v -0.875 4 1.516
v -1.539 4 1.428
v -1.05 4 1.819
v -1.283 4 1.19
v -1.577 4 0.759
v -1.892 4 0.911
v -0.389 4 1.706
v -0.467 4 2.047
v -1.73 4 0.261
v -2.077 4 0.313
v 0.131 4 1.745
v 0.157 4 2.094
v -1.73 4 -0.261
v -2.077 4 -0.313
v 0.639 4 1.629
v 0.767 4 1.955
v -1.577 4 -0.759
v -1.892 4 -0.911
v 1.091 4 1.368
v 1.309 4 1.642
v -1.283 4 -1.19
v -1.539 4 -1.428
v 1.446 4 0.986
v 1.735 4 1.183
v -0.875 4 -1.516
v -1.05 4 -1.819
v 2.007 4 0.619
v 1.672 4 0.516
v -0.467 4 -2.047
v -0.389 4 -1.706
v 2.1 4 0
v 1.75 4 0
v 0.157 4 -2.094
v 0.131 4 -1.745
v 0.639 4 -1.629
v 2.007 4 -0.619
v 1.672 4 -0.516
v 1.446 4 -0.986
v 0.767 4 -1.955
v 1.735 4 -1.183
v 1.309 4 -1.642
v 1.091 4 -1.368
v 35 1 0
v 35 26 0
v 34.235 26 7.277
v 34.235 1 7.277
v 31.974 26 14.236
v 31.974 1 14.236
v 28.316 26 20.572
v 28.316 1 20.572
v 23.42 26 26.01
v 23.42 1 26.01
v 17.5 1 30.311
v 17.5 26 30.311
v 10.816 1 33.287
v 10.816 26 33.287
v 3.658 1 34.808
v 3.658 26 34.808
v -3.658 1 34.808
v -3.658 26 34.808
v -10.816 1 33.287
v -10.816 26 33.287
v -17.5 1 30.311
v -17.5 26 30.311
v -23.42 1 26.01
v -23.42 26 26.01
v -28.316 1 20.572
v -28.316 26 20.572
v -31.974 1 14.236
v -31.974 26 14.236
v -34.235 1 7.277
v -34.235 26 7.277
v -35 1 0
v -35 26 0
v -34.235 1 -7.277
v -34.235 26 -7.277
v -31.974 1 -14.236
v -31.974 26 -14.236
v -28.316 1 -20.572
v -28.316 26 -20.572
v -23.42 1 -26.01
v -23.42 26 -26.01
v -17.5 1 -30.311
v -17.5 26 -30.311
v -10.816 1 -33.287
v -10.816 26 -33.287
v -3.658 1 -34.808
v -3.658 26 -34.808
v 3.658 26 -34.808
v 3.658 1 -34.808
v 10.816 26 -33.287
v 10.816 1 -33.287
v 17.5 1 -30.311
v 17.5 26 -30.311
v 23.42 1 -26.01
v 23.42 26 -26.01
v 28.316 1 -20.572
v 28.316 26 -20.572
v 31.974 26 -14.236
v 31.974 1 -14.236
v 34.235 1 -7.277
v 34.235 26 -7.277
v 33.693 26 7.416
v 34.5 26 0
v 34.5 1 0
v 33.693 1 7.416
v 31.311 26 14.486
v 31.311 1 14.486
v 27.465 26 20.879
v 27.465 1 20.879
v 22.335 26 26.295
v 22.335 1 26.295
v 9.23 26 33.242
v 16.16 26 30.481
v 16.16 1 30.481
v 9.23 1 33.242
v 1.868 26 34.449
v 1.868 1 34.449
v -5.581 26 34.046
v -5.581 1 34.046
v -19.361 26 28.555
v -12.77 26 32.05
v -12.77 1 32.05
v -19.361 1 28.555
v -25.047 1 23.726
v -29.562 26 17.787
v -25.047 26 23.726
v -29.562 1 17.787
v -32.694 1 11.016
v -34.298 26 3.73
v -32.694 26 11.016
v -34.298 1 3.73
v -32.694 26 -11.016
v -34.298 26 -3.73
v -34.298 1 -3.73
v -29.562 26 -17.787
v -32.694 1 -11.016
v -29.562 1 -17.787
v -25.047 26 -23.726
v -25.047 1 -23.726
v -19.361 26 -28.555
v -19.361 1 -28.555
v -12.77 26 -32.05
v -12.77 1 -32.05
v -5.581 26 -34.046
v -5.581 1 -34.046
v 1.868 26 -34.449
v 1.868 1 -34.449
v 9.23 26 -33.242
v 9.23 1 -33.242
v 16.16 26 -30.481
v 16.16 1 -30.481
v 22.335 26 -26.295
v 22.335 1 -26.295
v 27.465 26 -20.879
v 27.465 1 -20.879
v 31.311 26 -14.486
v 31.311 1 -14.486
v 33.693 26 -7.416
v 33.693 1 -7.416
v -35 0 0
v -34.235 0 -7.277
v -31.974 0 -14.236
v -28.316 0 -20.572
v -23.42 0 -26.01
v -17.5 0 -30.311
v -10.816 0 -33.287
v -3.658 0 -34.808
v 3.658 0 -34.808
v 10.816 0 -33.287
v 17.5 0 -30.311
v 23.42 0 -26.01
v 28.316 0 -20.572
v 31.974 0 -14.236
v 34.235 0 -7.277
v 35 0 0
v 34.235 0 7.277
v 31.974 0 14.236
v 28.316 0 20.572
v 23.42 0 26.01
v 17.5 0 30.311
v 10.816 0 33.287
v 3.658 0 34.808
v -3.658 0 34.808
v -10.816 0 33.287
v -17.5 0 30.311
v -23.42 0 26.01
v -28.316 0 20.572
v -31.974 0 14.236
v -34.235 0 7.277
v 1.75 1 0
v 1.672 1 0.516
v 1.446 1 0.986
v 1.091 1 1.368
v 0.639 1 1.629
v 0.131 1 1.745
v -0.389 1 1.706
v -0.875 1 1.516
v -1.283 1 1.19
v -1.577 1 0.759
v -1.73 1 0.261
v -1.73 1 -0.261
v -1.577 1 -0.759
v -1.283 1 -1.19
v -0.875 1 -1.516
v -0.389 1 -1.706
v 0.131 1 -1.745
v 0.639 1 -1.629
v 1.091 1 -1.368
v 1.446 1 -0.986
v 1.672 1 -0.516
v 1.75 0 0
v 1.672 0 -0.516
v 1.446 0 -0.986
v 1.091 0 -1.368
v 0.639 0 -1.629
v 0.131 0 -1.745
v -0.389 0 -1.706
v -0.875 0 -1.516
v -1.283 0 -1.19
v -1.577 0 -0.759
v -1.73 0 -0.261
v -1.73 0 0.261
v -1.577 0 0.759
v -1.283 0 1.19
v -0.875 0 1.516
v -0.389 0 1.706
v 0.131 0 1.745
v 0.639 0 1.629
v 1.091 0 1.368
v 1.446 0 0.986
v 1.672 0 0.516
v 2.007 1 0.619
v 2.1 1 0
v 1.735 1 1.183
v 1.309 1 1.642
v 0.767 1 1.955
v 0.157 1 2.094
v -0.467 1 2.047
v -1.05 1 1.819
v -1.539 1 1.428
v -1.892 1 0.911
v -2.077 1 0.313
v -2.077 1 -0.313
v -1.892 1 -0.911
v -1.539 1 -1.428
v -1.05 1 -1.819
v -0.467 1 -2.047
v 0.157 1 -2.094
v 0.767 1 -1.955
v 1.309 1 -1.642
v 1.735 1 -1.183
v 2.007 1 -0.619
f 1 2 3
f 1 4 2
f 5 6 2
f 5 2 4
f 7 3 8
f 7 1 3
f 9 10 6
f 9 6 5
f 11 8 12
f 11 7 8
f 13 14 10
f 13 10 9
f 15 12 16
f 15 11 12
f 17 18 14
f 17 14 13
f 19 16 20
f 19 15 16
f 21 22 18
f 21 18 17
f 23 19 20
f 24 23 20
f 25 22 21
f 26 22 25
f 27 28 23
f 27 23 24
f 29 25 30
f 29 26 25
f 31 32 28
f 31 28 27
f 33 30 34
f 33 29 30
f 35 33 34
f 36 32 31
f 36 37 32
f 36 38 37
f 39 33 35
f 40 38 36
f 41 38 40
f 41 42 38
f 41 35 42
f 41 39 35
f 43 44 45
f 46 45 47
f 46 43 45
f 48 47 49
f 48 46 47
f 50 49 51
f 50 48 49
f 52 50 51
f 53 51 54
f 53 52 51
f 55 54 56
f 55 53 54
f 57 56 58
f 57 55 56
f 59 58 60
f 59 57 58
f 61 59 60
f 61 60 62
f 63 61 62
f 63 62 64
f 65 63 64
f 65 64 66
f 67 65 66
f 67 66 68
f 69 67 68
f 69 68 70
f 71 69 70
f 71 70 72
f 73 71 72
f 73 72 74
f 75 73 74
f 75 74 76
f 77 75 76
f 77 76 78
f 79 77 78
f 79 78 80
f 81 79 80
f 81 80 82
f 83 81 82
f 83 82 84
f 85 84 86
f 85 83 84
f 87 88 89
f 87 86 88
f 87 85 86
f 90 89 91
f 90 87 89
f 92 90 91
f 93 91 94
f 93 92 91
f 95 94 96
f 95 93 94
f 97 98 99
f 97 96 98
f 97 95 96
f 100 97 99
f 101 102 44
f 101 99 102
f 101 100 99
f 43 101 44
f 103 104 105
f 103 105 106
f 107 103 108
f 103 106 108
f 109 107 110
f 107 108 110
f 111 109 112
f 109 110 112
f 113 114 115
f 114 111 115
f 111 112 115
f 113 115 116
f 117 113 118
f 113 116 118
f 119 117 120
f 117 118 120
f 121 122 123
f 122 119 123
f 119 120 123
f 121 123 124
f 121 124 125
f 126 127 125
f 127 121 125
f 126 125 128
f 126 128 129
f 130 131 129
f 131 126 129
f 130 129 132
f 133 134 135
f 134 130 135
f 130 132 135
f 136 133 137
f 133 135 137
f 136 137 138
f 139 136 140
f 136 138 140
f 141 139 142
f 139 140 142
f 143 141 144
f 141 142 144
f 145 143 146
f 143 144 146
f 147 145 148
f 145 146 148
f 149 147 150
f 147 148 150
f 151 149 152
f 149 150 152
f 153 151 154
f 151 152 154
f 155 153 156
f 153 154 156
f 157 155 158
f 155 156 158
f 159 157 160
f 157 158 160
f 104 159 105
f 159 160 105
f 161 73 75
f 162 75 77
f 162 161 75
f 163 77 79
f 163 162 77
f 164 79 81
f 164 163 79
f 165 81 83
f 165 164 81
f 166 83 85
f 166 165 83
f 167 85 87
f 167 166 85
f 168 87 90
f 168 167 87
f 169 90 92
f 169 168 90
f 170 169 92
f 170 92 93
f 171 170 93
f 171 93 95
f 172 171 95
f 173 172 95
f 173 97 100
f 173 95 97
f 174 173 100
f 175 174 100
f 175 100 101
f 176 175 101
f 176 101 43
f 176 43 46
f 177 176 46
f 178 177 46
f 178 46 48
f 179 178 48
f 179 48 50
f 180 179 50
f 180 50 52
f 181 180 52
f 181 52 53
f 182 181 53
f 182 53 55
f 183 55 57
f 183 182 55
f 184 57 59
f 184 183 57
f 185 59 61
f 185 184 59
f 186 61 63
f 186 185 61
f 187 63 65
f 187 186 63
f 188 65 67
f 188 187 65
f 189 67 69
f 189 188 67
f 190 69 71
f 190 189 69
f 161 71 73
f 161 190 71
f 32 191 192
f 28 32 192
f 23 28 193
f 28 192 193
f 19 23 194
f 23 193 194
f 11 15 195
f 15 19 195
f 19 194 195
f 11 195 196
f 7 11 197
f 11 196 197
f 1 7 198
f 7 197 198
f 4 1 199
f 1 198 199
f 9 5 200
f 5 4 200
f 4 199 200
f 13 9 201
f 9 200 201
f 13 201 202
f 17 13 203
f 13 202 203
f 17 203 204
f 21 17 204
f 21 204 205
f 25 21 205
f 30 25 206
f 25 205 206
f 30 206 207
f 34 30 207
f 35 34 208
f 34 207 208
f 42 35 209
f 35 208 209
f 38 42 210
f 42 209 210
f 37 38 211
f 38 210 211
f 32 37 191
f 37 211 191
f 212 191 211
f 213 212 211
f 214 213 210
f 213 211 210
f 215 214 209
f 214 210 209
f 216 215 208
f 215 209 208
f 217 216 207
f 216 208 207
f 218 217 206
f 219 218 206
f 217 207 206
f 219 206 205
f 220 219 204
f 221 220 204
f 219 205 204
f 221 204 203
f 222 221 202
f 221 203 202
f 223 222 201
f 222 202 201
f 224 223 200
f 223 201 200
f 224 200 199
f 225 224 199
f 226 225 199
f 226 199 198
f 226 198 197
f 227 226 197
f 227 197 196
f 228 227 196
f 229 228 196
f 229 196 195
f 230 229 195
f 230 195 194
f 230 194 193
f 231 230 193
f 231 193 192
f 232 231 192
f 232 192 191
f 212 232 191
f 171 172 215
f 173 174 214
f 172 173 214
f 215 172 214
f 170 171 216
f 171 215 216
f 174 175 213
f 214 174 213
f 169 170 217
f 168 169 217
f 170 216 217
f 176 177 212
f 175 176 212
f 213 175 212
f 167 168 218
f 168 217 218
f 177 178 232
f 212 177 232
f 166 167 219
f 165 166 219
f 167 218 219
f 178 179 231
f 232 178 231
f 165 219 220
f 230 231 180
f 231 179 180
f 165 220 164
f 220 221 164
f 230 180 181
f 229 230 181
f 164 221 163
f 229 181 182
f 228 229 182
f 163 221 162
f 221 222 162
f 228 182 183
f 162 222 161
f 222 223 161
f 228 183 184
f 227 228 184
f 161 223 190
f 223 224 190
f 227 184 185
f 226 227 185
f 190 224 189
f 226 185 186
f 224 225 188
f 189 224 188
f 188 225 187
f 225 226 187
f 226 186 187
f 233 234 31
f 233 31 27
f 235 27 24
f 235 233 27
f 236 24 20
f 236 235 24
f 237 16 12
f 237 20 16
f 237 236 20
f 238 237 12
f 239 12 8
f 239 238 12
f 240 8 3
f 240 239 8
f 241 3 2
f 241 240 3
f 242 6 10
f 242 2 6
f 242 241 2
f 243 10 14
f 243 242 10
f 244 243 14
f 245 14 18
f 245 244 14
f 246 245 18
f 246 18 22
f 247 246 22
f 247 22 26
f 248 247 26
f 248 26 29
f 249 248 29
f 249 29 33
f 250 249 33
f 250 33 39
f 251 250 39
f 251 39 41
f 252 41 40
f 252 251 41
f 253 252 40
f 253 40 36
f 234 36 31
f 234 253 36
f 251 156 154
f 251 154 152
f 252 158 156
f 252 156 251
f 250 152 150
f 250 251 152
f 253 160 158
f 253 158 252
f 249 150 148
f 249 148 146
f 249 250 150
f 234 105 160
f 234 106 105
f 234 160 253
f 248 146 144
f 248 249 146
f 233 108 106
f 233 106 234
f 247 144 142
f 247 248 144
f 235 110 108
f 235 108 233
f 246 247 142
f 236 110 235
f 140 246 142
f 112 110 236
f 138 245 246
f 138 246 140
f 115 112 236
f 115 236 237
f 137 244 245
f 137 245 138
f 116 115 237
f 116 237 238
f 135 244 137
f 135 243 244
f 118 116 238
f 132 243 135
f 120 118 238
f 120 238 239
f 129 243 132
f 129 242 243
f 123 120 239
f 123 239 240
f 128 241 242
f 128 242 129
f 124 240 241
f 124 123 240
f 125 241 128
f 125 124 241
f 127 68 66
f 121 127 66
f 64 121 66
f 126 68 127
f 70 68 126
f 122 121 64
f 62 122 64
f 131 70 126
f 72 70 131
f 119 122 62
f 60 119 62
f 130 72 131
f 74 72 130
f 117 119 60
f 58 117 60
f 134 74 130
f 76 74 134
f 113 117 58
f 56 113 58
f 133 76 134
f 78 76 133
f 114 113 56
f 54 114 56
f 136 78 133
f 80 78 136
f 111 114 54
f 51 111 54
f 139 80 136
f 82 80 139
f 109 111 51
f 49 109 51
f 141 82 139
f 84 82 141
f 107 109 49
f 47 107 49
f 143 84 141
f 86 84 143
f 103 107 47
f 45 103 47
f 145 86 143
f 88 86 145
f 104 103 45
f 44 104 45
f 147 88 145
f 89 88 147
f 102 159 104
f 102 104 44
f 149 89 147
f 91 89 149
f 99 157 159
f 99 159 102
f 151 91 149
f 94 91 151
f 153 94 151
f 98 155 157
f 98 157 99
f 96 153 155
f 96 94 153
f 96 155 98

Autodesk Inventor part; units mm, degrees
ref_plane "YZ Plane" through (0, 0, 0) normal (1, 0, 0) x (0, 1, 0)
ref_plane "XZ Plane" through (0, 0, 0) normal (0, 1, 0) x (-1, 0, 0)
ref_plane "XY Plane" through (0, 0, 0) normal (0, 0, 1) x (1, 0, 0)
sketch "Boceto1" plane through (0, 0, 0) normal (0, 1, 0) x (-1, 0, 0)
  circle A0 centre (0, 0) radius 34.5
  circle A1 centre (0, 0) radius 35
  dimension "d0" = 69
  dimension "d1" = 70
extrude "Extrusión1" add sketch "Boceto1" along normal blind 1 contours A0 | A1
sketch "Boceto2" plane through (0, 1, 0) normal (0, 1, 0) x (1, 0, 0)
  circle A0 centre (0, 0) radius 34.5
  circle A1 centre (0, 0) radius 35
  dimension "d4" = 69
  dimension "d5" = 70
extrude "Extrusión2" add sketch "Boceto2" along normal blind 25
sketch "Boceto3" plane through (0, 1, 0) normal (0, 1, 0) x (1, 0, 0)
  circle A0 centre (0, 0) radius 2.1
  circle A1 centre (0, 0) radius 1.75
  dimension "d8" = 4.2
  dimension "d9" = 3.5
extrude "Extrusión3" add sketch "Boceto3" along normal blind 3
sketch "Boceto4" plane through (0, 1, 0) normal (0, 1, 0) x (1, 0, 0)
  circle A0 centre (0, 0) radius 1.75
  dimension "d14" = 3.5
extrude "Extrusión4" cut sketch "Boceto4" against normal through all
properties part number "Molde"
